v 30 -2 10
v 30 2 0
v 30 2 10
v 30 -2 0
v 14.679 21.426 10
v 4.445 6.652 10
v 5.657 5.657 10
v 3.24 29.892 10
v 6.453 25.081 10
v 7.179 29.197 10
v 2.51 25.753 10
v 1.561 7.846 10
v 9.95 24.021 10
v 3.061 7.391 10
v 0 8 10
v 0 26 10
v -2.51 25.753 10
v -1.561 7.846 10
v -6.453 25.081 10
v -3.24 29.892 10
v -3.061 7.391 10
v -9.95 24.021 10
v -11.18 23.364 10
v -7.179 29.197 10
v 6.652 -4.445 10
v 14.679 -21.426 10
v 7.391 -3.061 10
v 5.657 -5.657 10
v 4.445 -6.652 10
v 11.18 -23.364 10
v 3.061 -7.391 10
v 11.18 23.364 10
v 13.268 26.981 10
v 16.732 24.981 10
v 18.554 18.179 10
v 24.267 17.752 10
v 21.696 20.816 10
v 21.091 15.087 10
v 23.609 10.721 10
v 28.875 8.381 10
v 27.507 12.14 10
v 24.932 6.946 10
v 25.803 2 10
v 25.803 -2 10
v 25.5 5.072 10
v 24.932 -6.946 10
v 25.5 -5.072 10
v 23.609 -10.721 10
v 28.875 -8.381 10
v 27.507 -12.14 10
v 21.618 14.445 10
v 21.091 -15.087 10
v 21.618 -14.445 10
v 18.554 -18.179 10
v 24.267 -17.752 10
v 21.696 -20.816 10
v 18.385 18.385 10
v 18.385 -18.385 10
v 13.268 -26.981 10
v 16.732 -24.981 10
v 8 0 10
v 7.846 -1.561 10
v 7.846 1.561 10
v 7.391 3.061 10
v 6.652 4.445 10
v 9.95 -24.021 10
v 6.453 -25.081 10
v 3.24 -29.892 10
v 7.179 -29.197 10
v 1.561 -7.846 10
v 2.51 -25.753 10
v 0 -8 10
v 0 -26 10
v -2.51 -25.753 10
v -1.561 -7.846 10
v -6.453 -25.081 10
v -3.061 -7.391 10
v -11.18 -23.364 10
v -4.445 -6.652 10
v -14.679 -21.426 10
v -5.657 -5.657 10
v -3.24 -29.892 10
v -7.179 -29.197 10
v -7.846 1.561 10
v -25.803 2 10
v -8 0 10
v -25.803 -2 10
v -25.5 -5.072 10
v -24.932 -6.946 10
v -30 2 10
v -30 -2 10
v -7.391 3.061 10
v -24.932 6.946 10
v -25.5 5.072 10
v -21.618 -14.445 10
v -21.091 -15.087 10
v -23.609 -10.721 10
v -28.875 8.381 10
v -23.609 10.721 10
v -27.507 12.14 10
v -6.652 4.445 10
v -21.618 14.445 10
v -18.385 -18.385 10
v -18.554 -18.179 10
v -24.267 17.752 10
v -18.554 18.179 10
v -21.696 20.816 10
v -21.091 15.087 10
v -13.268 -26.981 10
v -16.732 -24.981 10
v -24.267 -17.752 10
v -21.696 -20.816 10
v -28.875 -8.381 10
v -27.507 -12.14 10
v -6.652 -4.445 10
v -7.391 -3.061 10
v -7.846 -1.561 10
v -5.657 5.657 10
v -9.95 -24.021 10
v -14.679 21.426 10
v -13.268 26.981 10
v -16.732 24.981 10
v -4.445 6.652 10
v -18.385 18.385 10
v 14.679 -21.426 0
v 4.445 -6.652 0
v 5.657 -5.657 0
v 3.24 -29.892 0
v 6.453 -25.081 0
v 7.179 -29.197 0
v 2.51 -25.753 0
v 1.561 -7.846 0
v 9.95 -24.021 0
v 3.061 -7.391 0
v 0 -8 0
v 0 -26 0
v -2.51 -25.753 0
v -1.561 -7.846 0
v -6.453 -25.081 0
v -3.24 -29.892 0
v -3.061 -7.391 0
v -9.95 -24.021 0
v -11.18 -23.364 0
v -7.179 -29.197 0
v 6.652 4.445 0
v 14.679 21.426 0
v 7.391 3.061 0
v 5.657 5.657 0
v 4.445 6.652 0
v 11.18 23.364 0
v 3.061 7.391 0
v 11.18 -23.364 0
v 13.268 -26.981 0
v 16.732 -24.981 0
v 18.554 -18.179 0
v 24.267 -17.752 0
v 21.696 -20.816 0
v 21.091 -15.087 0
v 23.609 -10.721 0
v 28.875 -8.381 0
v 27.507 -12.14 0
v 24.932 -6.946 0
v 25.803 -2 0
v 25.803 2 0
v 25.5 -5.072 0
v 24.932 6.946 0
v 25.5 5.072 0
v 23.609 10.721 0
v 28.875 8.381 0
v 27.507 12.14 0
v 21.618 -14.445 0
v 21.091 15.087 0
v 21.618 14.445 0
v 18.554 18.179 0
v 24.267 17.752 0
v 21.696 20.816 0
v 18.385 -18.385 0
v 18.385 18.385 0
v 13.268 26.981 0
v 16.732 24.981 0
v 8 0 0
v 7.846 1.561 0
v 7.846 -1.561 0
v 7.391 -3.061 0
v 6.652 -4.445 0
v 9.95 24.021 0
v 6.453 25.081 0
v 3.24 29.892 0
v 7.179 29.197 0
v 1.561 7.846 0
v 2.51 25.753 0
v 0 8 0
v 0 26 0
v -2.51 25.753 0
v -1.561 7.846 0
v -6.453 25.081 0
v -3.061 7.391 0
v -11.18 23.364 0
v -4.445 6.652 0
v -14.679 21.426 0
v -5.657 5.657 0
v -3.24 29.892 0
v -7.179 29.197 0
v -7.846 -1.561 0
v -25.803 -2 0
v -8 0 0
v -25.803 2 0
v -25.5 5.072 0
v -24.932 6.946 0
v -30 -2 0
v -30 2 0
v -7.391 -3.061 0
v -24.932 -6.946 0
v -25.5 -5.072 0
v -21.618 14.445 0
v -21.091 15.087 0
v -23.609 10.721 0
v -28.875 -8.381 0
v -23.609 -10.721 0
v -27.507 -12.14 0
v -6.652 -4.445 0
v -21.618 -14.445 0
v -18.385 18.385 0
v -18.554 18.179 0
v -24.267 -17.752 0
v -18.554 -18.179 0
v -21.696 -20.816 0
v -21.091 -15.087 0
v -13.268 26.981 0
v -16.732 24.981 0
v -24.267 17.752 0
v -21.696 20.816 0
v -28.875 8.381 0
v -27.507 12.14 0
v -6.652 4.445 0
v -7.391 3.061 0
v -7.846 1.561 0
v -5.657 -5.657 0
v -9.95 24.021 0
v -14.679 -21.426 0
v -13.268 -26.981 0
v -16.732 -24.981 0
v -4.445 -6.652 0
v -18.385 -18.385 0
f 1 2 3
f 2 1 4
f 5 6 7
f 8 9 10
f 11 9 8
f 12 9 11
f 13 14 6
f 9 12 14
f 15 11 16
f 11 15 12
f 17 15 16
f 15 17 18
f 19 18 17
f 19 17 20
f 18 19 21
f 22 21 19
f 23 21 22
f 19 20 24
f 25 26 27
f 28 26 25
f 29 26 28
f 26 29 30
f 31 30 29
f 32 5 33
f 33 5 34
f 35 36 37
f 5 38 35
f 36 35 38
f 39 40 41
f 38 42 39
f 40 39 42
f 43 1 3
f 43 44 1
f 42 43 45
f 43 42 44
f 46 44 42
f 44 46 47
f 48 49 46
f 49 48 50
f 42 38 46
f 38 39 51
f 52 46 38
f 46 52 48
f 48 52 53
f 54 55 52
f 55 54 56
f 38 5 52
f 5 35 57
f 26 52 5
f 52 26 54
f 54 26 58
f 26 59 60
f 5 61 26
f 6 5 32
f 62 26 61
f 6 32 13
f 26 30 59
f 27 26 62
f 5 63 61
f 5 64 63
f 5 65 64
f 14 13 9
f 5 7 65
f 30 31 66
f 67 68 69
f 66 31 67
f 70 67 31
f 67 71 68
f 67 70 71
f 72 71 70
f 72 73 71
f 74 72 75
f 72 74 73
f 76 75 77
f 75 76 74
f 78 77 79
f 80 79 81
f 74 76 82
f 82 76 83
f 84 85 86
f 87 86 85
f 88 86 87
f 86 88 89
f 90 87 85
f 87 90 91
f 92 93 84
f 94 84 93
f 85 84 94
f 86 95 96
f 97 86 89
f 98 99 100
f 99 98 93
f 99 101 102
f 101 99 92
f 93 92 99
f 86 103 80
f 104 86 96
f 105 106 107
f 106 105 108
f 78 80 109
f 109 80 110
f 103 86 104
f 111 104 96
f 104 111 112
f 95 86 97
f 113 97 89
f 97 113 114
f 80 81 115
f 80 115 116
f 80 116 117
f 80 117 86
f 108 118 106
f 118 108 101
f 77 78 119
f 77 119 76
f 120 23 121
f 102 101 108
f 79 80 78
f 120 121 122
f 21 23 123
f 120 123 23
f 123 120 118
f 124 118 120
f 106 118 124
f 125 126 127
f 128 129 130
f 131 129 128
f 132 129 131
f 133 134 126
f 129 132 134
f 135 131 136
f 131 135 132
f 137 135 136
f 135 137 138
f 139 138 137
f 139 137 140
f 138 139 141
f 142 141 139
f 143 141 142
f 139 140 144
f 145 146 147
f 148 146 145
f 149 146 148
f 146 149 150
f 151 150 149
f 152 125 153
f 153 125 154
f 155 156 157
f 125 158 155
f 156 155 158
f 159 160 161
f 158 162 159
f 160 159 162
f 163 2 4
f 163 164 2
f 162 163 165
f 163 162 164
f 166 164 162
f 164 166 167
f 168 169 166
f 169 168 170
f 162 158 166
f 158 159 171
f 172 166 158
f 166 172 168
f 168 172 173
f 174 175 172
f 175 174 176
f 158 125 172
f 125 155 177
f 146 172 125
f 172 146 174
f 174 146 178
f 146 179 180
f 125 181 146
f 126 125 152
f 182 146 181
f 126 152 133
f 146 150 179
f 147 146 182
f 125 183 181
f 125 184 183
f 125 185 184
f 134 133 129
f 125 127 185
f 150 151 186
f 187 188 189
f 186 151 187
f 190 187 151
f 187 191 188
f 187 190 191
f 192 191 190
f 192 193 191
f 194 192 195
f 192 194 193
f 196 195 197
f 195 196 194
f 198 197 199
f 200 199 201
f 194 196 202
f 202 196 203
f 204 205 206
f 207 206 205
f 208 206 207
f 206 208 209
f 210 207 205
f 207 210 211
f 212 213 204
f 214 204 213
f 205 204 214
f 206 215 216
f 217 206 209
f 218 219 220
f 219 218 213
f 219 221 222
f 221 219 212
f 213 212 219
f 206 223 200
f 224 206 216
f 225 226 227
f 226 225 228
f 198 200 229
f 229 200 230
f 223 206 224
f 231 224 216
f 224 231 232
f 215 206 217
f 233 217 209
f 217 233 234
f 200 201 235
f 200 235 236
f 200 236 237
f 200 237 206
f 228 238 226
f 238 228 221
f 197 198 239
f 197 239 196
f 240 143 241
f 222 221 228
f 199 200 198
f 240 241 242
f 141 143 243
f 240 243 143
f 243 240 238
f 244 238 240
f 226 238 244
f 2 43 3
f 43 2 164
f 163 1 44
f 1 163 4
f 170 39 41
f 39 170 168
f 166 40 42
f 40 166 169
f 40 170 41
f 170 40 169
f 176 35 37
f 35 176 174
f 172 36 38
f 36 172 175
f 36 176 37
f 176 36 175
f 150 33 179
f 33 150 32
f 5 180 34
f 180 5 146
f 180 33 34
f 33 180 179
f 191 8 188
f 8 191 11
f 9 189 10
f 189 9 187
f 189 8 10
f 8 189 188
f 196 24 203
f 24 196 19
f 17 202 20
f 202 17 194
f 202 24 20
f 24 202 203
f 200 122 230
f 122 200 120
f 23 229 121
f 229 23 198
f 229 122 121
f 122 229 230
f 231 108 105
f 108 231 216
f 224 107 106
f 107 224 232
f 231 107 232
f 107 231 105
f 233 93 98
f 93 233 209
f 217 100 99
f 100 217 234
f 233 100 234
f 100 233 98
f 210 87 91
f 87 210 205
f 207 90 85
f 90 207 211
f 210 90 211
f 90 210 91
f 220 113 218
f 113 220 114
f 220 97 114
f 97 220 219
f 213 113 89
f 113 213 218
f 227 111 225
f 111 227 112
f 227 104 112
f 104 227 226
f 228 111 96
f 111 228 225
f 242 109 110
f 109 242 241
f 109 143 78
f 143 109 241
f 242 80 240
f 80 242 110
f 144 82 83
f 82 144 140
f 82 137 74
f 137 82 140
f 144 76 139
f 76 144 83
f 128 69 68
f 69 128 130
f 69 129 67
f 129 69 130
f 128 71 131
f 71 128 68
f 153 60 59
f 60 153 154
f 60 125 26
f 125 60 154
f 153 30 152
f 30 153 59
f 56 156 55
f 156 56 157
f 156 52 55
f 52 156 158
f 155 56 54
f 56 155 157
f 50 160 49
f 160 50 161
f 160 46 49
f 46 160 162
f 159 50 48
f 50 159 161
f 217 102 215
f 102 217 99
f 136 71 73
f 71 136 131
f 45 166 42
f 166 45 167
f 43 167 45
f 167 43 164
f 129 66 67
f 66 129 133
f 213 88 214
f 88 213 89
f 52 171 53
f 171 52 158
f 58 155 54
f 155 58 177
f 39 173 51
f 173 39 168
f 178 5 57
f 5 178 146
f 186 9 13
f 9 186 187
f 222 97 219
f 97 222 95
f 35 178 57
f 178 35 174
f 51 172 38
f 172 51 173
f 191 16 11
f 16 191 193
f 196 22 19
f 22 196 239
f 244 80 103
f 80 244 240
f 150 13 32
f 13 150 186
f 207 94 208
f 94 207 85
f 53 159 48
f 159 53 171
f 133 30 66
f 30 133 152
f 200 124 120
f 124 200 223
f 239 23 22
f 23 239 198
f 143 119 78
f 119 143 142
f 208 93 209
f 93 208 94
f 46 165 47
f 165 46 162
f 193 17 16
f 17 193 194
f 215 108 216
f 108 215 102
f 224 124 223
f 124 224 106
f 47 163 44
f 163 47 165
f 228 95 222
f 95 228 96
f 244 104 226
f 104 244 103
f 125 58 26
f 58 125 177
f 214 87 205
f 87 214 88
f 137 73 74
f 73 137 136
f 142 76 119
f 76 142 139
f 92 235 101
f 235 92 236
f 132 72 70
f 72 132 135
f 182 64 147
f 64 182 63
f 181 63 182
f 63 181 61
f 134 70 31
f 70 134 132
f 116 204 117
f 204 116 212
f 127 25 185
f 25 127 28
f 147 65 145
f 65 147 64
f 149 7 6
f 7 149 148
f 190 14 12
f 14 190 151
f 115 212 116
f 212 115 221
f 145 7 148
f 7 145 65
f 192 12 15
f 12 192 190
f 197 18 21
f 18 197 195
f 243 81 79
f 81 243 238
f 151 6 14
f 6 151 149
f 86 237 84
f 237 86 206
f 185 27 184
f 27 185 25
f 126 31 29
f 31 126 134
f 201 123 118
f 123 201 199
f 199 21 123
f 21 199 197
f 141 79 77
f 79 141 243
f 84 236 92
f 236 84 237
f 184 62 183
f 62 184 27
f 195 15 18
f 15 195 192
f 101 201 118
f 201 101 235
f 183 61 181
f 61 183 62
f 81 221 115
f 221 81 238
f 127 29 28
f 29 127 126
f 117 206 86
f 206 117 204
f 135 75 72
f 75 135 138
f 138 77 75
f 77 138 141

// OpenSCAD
$fn = 32;

// ----------------------------------------------------------------------
// Spur blank: bored gear blank
// ----------------------------------------------------------------------

// --- parameters (mm) ---
disc_r = 26;              // blank root radius
disc_t = 10;              // blank thickness
n_teeth = 18;             // stub tooth count
tooth_w = 4;              // tooth width at the root
tooth_h = 4;              // tooth height above the root
bore_r = 8;               // central bore radius
fit_tol = 0.02;           // tolerance for press fits, mm
free_tol = 0.2;           // tolerance for clearance fits, mm

out_r = disc_r + tooth_h;  // tip radius
bbox_x = 60.0;  // measured width over the teeth
bbox_y = 59.78;  // measured depth over the teeth

difference() {
union() {
  cylinder(r = disc_r, h = disc_t);
  for (i = [0 : n_teeth - 1])
    rotate([0, 0, i * 360 / n_teeth])
      translate([disc_r - 1, -tooth_w / 2, 0])
        cube([tooth_h + 1, tooth_w, disc_t]);
}
  translate([0, 0, -1]) cylinder(r = bore_r, h = disc_t + 2);
}
